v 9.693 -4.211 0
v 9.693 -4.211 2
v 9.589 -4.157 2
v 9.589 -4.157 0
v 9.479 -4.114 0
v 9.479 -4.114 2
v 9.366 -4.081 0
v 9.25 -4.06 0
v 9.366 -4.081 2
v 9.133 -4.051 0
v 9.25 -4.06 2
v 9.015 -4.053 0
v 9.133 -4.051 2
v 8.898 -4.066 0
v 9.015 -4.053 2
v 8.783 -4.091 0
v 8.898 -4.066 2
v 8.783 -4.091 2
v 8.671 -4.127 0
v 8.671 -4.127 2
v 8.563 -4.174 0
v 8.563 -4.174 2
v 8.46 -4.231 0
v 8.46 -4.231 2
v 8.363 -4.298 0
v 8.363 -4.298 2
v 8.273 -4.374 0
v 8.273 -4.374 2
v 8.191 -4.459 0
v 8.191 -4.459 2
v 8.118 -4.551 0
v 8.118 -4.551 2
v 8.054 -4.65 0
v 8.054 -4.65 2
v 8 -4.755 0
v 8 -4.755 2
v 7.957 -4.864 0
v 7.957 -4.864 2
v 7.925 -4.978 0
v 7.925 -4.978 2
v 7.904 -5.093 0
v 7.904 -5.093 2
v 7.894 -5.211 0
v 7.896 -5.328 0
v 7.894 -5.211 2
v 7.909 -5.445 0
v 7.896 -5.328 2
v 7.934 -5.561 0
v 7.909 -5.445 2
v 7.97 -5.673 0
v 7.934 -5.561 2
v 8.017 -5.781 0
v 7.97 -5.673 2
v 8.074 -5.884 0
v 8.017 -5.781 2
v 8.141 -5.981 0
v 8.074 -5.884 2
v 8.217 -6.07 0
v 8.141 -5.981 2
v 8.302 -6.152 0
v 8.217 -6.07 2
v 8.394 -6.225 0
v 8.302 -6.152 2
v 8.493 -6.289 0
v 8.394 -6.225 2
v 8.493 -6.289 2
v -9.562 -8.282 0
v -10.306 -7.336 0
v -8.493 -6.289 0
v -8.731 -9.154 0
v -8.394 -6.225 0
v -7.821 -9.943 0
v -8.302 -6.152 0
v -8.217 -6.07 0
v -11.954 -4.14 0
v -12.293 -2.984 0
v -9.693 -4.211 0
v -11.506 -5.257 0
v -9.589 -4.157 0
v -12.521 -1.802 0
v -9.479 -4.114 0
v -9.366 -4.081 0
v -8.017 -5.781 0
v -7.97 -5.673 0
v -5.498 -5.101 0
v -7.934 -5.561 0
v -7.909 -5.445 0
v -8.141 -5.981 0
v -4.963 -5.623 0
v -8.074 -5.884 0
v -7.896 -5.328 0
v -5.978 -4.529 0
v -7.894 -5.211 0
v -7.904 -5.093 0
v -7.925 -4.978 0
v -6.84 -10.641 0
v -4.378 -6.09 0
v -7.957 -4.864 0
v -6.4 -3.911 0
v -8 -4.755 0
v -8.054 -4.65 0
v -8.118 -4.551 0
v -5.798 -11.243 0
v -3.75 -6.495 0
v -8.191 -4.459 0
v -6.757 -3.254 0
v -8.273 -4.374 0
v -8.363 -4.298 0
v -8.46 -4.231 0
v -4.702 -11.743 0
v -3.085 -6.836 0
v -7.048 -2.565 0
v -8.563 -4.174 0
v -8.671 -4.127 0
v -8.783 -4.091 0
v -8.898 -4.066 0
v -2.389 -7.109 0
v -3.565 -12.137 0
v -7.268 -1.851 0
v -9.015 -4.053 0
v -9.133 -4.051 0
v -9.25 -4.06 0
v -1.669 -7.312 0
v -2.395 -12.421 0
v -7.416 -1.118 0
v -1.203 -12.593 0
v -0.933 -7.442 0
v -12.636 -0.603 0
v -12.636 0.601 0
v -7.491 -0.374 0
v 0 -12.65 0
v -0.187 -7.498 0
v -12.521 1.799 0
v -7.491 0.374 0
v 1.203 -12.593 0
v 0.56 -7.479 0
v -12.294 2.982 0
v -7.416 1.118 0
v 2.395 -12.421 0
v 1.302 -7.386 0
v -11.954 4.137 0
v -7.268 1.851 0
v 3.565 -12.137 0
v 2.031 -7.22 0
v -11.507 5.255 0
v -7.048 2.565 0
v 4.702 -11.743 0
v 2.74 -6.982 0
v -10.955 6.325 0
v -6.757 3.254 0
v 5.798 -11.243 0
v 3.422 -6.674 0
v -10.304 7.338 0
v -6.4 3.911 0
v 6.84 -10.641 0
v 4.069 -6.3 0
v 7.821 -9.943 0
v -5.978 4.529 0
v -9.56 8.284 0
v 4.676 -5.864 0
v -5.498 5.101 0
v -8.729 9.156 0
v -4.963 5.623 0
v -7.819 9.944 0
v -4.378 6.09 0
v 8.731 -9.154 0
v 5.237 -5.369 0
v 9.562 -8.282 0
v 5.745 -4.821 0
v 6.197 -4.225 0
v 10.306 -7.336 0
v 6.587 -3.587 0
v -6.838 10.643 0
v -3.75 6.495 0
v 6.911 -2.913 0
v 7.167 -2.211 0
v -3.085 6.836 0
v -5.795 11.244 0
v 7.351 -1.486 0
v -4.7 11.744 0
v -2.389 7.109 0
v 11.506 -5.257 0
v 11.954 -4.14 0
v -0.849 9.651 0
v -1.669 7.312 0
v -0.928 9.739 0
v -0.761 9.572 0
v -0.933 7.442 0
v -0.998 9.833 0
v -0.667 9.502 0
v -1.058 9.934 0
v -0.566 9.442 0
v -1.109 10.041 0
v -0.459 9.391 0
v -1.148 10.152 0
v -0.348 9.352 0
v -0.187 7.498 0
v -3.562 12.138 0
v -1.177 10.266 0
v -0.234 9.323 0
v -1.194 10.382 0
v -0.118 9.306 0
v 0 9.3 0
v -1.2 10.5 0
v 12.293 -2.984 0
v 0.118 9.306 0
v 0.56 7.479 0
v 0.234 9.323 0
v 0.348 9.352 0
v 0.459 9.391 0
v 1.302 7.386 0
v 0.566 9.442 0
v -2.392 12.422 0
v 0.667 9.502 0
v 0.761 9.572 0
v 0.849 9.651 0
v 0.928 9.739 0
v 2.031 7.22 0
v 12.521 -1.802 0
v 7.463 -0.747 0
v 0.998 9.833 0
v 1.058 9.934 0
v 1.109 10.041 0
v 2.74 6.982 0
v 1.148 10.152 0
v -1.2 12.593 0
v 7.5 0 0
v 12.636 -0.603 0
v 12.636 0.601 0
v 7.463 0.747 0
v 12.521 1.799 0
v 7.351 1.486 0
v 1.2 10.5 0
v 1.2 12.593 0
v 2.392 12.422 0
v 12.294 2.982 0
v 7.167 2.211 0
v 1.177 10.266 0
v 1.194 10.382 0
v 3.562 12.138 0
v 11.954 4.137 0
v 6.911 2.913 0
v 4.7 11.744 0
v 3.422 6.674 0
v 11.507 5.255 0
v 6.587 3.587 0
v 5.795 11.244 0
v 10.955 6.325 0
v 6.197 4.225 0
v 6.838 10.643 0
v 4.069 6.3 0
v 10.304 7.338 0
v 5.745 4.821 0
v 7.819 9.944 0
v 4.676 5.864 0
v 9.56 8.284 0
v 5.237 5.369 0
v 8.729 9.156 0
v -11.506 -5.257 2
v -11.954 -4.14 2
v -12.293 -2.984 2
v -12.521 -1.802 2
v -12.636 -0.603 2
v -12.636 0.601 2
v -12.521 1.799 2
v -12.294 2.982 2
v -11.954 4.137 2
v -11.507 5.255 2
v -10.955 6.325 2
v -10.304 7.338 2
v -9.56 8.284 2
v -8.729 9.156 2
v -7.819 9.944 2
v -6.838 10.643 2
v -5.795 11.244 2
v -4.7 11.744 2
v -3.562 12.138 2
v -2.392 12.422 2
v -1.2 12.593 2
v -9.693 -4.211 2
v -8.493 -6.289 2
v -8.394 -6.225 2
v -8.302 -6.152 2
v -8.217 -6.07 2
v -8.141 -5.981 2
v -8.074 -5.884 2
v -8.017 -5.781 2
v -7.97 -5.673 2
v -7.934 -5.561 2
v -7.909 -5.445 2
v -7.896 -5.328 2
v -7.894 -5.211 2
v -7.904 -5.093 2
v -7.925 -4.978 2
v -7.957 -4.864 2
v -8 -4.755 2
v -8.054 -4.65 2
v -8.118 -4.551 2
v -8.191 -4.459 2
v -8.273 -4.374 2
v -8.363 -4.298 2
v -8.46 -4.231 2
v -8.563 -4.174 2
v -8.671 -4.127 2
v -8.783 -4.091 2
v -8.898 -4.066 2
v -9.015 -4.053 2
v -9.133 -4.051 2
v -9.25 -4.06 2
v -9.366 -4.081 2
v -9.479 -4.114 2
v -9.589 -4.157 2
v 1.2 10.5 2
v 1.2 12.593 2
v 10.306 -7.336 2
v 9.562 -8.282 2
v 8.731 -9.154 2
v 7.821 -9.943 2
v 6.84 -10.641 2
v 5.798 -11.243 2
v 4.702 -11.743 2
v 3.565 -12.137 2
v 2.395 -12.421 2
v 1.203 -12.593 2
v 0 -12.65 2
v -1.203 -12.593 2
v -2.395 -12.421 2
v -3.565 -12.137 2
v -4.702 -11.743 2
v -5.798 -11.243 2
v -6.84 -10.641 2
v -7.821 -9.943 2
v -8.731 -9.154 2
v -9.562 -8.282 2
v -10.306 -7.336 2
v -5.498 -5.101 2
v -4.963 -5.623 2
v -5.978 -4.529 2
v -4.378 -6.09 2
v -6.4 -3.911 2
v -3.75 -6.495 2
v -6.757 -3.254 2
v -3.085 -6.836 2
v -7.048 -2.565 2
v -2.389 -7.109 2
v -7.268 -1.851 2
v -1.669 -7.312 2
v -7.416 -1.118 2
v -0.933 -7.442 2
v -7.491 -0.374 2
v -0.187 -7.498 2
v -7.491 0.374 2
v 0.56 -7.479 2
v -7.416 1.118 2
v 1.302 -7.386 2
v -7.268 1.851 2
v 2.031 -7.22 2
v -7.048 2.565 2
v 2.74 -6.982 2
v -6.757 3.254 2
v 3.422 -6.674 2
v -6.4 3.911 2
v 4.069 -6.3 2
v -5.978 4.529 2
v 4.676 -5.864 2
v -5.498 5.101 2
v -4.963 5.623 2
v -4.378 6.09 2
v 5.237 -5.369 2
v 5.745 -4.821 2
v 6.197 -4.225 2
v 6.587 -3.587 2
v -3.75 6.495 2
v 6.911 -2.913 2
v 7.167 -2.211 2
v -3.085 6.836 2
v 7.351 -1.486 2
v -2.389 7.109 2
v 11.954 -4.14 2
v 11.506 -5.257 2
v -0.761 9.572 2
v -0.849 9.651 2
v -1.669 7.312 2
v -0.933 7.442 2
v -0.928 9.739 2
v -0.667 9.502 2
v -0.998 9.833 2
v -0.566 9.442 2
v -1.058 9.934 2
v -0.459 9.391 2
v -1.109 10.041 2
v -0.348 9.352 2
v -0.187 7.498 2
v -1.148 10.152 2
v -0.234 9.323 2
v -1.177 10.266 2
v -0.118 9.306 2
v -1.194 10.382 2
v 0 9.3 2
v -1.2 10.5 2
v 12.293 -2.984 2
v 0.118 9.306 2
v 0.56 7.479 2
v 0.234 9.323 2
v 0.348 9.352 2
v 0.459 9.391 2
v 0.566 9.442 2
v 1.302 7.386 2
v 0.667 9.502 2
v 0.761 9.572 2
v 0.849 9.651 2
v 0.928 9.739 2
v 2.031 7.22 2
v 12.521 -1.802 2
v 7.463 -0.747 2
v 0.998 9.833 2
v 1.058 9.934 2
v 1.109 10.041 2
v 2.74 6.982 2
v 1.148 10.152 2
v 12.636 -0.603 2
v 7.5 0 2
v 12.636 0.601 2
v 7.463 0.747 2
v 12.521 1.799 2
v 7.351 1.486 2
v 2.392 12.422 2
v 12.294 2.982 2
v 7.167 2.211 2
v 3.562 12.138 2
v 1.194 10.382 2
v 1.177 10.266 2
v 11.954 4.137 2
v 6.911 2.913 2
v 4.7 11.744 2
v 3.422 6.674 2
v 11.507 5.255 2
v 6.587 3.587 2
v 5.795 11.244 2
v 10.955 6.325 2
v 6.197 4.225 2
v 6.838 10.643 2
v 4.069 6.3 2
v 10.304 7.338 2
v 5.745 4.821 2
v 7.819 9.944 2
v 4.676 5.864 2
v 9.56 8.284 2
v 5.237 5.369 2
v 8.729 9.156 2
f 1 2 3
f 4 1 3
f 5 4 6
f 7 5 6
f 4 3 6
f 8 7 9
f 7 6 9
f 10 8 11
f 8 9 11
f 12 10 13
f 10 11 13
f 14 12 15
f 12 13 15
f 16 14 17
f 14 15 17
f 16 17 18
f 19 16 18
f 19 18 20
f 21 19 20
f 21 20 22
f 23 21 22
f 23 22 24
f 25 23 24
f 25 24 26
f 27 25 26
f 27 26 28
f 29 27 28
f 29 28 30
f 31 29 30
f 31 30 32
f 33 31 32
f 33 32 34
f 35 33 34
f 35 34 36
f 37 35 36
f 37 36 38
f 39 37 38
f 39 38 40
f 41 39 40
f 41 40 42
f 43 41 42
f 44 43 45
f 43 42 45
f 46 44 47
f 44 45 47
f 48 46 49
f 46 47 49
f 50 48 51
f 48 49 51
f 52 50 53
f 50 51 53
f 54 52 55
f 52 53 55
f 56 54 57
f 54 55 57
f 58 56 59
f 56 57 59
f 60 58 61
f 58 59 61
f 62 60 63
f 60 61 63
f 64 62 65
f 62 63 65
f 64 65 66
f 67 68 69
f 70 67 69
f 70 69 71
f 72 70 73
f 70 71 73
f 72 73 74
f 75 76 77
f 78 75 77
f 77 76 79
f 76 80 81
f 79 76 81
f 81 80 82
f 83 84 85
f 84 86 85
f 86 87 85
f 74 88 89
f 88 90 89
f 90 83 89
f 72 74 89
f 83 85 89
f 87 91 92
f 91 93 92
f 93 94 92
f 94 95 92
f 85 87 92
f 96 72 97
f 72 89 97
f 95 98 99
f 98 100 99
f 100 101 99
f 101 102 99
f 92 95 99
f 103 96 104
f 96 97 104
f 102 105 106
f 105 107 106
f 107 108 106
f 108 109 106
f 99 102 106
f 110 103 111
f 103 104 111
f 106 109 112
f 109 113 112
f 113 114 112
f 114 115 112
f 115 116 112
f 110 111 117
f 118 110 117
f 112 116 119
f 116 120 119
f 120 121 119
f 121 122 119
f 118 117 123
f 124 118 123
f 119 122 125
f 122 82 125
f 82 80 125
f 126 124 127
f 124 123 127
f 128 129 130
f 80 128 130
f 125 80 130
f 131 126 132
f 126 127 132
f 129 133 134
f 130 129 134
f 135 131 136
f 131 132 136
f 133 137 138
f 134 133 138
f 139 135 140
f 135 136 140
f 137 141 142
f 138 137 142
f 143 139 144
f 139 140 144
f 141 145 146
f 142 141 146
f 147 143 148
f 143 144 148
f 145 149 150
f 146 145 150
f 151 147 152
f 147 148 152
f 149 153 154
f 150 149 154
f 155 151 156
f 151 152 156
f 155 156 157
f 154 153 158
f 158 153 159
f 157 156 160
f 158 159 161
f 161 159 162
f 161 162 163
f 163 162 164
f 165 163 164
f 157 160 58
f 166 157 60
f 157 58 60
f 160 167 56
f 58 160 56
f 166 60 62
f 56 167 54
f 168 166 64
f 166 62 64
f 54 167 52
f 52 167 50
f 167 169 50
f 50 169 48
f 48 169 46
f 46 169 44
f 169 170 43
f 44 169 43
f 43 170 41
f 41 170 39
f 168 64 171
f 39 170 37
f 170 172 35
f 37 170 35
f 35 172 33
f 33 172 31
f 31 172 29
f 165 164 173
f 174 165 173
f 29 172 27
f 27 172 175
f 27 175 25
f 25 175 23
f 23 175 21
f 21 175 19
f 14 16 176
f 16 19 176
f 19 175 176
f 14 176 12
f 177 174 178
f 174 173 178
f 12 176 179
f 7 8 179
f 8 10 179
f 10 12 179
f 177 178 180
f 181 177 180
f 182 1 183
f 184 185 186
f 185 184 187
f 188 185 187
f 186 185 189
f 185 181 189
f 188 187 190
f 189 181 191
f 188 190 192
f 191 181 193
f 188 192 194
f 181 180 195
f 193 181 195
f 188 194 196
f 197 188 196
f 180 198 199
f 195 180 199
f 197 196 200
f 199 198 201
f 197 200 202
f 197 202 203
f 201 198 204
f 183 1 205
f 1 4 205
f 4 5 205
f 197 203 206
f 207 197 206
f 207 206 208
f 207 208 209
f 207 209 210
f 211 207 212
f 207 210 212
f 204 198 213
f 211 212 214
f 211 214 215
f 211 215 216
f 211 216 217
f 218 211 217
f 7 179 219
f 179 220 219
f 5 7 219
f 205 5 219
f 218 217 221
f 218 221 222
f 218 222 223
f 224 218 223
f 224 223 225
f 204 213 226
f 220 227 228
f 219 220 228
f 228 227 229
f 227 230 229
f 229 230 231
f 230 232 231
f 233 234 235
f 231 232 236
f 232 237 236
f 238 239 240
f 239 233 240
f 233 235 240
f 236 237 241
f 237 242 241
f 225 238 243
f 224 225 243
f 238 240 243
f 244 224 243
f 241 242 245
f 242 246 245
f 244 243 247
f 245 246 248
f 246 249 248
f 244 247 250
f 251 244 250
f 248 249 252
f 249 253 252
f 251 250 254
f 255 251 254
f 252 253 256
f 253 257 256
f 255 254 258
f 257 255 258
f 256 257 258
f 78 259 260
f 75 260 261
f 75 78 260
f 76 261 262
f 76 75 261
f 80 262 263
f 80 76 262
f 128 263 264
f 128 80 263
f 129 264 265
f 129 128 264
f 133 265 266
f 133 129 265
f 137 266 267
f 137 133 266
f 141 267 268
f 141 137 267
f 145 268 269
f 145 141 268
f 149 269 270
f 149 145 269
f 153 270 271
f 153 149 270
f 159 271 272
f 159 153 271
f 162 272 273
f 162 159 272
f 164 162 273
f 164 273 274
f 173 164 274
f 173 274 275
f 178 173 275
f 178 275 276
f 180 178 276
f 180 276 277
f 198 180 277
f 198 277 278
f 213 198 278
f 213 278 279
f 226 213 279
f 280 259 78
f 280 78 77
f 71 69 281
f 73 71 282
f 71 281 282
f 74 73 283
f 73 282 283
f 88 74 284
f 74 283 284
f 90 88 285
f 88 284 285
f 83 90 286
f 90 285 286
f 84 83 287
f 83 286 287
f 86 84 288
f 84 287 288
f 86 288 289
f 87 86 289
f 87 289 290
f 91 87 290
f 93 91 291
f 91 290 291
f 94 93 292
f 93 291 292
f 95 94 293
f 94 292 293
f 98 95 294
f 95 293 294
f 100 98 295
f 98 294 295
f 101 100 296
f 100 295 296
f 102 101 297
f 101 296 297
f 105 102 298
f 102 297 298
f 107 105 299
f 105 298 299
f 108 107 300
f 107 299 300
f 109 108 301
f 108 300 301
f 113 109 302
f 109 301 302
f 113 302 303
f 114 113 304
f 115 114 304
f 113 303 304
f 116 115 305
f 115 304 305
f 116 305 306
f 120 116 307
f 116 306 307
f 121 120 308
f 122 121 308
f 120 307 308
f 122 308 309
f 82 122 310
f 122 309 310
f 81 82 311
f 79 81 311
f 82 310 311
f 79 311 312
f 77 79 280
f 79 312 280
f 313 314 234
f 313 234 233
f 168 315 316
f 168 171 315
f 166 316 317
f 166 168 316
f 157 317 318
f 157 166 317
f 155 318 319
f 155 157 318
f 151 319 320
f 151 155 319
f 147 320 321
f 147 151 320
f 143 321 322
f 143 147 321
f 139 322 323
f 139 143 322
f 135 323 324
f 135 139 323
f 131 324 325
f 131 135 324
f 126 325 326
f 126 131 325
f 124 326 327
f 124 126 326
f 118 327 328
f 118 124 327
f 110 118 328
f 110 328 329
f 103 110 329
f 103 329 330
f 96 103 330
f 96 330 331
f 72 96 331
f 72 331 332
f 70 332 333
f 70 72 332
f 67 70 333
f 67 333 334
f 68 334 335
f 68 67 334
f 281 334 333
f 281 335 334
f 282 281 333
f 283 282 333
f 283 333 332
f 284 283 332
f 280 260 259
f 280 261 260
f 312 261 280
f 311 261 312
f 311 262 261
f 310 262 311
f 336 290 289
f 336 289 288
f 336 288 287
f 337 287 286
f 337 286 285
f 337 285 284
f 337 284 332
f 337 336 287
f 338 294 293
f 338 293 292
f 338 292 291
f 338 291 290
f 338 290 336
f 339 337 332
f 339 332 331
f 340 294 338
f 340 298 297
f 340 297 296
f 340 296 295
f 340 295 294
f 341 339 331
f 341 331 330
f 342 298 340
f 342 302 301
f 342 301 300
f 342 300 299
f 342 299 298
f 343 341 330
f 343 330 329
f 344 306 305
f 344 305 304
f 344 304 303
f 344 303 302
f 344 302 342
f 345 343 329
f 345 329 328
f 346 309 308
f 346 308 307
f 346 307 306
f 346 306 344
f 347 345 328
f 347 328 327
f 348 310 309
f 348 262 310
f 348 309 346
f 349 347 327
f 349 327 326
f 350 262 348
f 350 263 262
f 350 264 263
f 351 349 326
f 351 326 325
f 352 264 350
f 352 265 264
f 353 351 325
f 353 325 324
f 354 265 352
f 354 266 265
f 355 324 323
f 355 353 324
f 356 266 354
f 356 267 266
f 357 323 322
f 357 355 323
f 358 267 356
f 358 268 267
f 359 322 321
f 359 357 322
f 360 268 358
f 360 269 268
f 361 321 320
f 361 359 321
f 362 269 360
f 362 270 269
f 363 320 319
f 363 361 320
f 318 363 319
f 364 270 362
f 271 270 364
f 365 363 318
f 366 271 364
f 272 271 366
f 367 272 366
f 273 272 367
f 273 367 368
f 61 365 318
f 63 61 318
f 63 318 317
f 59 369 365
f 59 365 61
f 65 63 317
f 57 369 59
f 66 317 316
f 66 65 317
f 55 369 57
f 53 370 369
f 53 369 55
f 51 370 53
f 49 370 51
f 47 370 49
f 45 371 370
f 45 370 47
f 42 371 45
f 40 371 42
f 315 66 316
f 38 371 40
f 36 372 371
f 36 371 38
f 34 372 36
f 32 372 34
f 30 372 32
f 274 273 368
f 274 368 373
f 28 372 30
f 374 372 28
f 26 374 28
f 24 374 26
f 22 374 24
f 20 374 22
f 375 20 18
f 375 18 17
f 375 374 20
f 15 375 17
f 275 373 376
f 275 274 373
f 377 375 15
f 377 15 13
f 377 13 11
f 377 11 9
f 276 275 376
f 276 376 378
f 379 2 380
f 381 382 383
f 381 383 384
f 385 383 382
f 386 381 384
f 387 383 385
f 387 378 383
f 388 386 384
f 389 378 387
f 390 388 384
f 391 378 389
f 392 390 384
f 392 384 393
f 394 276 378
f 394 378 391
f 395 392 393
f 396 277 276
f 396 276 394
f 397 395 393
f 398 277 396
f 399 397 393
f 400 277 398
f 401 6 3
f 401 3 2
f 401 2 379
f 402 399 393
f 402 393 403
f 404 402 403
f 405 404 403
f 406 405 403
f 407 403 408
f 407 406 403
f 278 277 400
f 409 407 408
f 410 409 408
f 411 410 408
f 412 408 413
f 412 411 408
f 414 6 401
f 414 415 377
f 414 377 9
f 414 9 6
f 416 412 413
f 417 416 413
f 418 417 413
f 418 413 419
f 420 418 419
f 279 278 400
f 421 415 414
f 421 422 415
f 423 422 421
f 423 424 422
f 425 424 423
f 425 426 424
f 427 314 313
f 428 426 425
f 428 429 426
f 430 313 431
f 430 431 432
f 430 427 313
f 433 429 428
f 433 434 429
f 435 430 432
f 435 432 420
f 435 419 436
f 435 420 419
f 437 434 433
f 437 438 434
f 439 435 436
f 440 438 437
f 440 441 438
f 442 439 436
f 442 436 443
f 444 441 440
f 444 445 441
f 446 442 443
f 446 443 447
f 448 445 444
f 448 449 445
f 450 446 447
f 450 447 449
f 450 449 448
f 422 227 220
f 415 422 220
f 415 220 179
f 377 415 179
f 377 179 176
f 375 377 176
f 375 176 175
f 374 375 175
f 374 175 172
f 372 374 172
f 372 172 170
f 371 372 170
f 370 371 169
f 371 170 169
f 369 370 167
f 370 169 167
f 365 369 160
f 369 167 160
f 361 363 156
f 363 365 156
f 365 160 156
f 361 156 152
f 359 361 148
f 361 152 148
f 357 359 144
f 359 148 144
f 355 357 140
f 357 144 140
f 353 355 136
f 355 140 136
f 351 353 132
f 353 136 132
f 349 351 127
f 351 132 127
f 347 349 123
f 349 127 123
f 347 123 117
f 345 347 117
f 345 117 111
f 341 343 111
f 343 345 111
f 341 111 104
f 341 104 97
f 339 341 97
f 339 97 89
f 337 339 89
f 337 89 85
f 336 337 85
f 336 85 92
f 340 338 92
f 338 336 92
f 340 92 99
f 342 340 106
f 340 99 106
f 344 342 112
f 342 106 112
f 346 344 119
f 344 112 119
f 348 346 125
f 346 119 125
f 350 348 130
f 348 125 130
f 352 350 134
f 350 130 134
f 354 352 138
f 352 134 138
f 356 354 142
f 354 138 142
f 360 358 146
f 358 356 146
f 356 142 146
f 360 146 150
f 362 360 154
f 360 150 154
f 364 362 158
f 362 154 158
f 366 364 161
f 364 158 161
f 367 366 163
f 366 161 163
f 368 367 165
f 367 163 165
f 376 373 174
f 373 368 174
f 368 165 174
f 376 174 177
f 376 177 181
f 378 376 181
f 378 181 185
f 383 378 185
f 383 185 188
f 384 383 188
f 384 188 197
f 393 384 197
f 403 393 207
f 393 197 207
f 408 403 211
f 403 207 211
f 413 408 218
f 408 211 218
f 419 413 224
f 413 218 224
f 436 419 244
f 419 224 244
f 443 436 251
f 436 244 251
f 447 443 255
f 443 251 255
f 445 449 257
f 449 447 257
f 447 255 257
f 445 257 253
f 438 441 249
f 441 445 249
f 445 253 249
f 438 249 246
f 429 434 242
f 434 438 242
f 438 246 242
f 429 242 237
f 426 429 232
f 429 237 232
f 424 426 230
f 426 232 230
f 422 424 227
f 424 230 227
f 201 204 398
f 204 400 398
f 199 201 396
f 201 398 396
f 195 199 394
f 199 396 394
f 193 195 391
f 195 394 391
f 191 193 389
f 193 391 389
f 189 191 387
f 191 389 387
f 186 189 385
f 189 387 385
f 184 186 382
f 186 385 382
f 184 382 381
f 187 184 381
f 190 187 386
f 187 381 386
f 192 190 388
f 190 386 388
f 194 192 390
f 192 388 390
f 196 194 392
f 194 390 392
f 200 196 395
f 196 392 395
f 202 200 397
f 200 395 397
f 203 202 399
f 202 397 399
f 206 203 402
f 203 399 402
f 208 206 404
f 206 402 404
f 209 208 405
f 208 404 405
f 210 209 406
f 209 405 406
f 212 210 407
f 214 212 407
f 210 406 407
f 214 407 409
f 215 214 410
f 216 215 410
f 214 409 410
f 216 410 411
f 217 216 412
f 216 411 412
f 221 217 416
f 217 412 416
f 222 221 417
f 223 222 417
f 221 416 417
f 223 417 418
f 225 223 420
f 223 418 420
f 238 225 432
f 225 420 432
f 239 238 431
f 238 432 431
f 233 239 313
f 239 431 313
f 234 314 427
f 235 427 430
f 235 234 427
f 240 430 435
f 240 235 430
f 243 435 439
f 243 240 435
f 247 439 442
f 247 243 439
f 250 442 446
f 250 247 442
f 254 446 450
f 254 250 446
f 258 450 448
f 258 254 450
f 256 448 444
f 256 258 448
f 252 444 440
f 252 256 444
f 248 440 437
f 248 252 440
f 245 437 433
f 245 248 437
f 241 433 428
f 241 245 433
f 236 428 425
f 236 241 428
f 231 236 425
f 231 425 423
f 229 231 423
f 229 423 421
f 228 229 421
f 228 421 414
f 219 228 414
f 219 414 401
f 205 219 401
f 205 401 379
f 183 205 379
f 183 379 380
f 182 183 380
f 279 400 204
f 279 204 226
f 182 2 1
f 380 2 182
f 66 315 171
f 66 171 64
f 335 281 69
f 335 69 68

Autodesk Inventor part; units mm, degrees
ref_plane "YZ Plane" through (0, 0, 0) normal (1, 0, 0) x (0, 1, 0)
ref_plane "XZ Plane" through (0, 0, 0) normal (0, 1, 0) x (-1, 0, 0)
ref_plane "XY Plane" through (0, 0, 0) normal (0, 0, 1) x (1, 0, 0)
sketch "Skizze1" plane through (0, 0, 0) normal (0, 0, 1) x (1, 0, 0)
  circle A0 centre (0, 0) radius 12.65
  circle A1 centre (0, 0) radius 7.5
  dimension "d0" = 15
  dimension "d1" = 25.3
extrude "Extrusion1" add sketch "Skizze1" along normal blind 2
sketch "Skizze2" plane through (0, 0, 2) normal (0, 0, 1) x (1, 0, 0)
  circle A0 centre (0, 0) radius 12.65 projected
  circle A1 centre (0, 0) radius 7.5 projected
  arc A2 (-1.2, 10.5) -> (1.2, 10.5) centre (0, 10.5) ccw
  line L0 (-1.2, 10.5) -> (-1.2, 13.3719)
  line L1 (-1.2, 13.3719) -> (1.2, 13.3719)
  line L2 (1.2, 13.3719) -> (1.2, 10.5)
  line L3 (0, 12.65) -> (0, 7.5)
  line L4 (0, -17.8544) -> (0, 18.5762) projected
  dimension "d4" = 2.4
  dimension "d10" = 10.5
extrude "Extrusion2" cut sketch "Skizze2" against normal blind 2.4 contours L2 A2 L3 A0 | A0 L4 L1 L2 | L3 A2 L0 A0 | A0 L0 L1 L4
pattern_circular "Runde Anordnung1" count 3 over 360 about axis through (0, 0, 0) along (0, 0, 1) of "Extrusion2"
equation "\"d5\" = d4"
properties part number "P_Lagerschale_Deckel"
